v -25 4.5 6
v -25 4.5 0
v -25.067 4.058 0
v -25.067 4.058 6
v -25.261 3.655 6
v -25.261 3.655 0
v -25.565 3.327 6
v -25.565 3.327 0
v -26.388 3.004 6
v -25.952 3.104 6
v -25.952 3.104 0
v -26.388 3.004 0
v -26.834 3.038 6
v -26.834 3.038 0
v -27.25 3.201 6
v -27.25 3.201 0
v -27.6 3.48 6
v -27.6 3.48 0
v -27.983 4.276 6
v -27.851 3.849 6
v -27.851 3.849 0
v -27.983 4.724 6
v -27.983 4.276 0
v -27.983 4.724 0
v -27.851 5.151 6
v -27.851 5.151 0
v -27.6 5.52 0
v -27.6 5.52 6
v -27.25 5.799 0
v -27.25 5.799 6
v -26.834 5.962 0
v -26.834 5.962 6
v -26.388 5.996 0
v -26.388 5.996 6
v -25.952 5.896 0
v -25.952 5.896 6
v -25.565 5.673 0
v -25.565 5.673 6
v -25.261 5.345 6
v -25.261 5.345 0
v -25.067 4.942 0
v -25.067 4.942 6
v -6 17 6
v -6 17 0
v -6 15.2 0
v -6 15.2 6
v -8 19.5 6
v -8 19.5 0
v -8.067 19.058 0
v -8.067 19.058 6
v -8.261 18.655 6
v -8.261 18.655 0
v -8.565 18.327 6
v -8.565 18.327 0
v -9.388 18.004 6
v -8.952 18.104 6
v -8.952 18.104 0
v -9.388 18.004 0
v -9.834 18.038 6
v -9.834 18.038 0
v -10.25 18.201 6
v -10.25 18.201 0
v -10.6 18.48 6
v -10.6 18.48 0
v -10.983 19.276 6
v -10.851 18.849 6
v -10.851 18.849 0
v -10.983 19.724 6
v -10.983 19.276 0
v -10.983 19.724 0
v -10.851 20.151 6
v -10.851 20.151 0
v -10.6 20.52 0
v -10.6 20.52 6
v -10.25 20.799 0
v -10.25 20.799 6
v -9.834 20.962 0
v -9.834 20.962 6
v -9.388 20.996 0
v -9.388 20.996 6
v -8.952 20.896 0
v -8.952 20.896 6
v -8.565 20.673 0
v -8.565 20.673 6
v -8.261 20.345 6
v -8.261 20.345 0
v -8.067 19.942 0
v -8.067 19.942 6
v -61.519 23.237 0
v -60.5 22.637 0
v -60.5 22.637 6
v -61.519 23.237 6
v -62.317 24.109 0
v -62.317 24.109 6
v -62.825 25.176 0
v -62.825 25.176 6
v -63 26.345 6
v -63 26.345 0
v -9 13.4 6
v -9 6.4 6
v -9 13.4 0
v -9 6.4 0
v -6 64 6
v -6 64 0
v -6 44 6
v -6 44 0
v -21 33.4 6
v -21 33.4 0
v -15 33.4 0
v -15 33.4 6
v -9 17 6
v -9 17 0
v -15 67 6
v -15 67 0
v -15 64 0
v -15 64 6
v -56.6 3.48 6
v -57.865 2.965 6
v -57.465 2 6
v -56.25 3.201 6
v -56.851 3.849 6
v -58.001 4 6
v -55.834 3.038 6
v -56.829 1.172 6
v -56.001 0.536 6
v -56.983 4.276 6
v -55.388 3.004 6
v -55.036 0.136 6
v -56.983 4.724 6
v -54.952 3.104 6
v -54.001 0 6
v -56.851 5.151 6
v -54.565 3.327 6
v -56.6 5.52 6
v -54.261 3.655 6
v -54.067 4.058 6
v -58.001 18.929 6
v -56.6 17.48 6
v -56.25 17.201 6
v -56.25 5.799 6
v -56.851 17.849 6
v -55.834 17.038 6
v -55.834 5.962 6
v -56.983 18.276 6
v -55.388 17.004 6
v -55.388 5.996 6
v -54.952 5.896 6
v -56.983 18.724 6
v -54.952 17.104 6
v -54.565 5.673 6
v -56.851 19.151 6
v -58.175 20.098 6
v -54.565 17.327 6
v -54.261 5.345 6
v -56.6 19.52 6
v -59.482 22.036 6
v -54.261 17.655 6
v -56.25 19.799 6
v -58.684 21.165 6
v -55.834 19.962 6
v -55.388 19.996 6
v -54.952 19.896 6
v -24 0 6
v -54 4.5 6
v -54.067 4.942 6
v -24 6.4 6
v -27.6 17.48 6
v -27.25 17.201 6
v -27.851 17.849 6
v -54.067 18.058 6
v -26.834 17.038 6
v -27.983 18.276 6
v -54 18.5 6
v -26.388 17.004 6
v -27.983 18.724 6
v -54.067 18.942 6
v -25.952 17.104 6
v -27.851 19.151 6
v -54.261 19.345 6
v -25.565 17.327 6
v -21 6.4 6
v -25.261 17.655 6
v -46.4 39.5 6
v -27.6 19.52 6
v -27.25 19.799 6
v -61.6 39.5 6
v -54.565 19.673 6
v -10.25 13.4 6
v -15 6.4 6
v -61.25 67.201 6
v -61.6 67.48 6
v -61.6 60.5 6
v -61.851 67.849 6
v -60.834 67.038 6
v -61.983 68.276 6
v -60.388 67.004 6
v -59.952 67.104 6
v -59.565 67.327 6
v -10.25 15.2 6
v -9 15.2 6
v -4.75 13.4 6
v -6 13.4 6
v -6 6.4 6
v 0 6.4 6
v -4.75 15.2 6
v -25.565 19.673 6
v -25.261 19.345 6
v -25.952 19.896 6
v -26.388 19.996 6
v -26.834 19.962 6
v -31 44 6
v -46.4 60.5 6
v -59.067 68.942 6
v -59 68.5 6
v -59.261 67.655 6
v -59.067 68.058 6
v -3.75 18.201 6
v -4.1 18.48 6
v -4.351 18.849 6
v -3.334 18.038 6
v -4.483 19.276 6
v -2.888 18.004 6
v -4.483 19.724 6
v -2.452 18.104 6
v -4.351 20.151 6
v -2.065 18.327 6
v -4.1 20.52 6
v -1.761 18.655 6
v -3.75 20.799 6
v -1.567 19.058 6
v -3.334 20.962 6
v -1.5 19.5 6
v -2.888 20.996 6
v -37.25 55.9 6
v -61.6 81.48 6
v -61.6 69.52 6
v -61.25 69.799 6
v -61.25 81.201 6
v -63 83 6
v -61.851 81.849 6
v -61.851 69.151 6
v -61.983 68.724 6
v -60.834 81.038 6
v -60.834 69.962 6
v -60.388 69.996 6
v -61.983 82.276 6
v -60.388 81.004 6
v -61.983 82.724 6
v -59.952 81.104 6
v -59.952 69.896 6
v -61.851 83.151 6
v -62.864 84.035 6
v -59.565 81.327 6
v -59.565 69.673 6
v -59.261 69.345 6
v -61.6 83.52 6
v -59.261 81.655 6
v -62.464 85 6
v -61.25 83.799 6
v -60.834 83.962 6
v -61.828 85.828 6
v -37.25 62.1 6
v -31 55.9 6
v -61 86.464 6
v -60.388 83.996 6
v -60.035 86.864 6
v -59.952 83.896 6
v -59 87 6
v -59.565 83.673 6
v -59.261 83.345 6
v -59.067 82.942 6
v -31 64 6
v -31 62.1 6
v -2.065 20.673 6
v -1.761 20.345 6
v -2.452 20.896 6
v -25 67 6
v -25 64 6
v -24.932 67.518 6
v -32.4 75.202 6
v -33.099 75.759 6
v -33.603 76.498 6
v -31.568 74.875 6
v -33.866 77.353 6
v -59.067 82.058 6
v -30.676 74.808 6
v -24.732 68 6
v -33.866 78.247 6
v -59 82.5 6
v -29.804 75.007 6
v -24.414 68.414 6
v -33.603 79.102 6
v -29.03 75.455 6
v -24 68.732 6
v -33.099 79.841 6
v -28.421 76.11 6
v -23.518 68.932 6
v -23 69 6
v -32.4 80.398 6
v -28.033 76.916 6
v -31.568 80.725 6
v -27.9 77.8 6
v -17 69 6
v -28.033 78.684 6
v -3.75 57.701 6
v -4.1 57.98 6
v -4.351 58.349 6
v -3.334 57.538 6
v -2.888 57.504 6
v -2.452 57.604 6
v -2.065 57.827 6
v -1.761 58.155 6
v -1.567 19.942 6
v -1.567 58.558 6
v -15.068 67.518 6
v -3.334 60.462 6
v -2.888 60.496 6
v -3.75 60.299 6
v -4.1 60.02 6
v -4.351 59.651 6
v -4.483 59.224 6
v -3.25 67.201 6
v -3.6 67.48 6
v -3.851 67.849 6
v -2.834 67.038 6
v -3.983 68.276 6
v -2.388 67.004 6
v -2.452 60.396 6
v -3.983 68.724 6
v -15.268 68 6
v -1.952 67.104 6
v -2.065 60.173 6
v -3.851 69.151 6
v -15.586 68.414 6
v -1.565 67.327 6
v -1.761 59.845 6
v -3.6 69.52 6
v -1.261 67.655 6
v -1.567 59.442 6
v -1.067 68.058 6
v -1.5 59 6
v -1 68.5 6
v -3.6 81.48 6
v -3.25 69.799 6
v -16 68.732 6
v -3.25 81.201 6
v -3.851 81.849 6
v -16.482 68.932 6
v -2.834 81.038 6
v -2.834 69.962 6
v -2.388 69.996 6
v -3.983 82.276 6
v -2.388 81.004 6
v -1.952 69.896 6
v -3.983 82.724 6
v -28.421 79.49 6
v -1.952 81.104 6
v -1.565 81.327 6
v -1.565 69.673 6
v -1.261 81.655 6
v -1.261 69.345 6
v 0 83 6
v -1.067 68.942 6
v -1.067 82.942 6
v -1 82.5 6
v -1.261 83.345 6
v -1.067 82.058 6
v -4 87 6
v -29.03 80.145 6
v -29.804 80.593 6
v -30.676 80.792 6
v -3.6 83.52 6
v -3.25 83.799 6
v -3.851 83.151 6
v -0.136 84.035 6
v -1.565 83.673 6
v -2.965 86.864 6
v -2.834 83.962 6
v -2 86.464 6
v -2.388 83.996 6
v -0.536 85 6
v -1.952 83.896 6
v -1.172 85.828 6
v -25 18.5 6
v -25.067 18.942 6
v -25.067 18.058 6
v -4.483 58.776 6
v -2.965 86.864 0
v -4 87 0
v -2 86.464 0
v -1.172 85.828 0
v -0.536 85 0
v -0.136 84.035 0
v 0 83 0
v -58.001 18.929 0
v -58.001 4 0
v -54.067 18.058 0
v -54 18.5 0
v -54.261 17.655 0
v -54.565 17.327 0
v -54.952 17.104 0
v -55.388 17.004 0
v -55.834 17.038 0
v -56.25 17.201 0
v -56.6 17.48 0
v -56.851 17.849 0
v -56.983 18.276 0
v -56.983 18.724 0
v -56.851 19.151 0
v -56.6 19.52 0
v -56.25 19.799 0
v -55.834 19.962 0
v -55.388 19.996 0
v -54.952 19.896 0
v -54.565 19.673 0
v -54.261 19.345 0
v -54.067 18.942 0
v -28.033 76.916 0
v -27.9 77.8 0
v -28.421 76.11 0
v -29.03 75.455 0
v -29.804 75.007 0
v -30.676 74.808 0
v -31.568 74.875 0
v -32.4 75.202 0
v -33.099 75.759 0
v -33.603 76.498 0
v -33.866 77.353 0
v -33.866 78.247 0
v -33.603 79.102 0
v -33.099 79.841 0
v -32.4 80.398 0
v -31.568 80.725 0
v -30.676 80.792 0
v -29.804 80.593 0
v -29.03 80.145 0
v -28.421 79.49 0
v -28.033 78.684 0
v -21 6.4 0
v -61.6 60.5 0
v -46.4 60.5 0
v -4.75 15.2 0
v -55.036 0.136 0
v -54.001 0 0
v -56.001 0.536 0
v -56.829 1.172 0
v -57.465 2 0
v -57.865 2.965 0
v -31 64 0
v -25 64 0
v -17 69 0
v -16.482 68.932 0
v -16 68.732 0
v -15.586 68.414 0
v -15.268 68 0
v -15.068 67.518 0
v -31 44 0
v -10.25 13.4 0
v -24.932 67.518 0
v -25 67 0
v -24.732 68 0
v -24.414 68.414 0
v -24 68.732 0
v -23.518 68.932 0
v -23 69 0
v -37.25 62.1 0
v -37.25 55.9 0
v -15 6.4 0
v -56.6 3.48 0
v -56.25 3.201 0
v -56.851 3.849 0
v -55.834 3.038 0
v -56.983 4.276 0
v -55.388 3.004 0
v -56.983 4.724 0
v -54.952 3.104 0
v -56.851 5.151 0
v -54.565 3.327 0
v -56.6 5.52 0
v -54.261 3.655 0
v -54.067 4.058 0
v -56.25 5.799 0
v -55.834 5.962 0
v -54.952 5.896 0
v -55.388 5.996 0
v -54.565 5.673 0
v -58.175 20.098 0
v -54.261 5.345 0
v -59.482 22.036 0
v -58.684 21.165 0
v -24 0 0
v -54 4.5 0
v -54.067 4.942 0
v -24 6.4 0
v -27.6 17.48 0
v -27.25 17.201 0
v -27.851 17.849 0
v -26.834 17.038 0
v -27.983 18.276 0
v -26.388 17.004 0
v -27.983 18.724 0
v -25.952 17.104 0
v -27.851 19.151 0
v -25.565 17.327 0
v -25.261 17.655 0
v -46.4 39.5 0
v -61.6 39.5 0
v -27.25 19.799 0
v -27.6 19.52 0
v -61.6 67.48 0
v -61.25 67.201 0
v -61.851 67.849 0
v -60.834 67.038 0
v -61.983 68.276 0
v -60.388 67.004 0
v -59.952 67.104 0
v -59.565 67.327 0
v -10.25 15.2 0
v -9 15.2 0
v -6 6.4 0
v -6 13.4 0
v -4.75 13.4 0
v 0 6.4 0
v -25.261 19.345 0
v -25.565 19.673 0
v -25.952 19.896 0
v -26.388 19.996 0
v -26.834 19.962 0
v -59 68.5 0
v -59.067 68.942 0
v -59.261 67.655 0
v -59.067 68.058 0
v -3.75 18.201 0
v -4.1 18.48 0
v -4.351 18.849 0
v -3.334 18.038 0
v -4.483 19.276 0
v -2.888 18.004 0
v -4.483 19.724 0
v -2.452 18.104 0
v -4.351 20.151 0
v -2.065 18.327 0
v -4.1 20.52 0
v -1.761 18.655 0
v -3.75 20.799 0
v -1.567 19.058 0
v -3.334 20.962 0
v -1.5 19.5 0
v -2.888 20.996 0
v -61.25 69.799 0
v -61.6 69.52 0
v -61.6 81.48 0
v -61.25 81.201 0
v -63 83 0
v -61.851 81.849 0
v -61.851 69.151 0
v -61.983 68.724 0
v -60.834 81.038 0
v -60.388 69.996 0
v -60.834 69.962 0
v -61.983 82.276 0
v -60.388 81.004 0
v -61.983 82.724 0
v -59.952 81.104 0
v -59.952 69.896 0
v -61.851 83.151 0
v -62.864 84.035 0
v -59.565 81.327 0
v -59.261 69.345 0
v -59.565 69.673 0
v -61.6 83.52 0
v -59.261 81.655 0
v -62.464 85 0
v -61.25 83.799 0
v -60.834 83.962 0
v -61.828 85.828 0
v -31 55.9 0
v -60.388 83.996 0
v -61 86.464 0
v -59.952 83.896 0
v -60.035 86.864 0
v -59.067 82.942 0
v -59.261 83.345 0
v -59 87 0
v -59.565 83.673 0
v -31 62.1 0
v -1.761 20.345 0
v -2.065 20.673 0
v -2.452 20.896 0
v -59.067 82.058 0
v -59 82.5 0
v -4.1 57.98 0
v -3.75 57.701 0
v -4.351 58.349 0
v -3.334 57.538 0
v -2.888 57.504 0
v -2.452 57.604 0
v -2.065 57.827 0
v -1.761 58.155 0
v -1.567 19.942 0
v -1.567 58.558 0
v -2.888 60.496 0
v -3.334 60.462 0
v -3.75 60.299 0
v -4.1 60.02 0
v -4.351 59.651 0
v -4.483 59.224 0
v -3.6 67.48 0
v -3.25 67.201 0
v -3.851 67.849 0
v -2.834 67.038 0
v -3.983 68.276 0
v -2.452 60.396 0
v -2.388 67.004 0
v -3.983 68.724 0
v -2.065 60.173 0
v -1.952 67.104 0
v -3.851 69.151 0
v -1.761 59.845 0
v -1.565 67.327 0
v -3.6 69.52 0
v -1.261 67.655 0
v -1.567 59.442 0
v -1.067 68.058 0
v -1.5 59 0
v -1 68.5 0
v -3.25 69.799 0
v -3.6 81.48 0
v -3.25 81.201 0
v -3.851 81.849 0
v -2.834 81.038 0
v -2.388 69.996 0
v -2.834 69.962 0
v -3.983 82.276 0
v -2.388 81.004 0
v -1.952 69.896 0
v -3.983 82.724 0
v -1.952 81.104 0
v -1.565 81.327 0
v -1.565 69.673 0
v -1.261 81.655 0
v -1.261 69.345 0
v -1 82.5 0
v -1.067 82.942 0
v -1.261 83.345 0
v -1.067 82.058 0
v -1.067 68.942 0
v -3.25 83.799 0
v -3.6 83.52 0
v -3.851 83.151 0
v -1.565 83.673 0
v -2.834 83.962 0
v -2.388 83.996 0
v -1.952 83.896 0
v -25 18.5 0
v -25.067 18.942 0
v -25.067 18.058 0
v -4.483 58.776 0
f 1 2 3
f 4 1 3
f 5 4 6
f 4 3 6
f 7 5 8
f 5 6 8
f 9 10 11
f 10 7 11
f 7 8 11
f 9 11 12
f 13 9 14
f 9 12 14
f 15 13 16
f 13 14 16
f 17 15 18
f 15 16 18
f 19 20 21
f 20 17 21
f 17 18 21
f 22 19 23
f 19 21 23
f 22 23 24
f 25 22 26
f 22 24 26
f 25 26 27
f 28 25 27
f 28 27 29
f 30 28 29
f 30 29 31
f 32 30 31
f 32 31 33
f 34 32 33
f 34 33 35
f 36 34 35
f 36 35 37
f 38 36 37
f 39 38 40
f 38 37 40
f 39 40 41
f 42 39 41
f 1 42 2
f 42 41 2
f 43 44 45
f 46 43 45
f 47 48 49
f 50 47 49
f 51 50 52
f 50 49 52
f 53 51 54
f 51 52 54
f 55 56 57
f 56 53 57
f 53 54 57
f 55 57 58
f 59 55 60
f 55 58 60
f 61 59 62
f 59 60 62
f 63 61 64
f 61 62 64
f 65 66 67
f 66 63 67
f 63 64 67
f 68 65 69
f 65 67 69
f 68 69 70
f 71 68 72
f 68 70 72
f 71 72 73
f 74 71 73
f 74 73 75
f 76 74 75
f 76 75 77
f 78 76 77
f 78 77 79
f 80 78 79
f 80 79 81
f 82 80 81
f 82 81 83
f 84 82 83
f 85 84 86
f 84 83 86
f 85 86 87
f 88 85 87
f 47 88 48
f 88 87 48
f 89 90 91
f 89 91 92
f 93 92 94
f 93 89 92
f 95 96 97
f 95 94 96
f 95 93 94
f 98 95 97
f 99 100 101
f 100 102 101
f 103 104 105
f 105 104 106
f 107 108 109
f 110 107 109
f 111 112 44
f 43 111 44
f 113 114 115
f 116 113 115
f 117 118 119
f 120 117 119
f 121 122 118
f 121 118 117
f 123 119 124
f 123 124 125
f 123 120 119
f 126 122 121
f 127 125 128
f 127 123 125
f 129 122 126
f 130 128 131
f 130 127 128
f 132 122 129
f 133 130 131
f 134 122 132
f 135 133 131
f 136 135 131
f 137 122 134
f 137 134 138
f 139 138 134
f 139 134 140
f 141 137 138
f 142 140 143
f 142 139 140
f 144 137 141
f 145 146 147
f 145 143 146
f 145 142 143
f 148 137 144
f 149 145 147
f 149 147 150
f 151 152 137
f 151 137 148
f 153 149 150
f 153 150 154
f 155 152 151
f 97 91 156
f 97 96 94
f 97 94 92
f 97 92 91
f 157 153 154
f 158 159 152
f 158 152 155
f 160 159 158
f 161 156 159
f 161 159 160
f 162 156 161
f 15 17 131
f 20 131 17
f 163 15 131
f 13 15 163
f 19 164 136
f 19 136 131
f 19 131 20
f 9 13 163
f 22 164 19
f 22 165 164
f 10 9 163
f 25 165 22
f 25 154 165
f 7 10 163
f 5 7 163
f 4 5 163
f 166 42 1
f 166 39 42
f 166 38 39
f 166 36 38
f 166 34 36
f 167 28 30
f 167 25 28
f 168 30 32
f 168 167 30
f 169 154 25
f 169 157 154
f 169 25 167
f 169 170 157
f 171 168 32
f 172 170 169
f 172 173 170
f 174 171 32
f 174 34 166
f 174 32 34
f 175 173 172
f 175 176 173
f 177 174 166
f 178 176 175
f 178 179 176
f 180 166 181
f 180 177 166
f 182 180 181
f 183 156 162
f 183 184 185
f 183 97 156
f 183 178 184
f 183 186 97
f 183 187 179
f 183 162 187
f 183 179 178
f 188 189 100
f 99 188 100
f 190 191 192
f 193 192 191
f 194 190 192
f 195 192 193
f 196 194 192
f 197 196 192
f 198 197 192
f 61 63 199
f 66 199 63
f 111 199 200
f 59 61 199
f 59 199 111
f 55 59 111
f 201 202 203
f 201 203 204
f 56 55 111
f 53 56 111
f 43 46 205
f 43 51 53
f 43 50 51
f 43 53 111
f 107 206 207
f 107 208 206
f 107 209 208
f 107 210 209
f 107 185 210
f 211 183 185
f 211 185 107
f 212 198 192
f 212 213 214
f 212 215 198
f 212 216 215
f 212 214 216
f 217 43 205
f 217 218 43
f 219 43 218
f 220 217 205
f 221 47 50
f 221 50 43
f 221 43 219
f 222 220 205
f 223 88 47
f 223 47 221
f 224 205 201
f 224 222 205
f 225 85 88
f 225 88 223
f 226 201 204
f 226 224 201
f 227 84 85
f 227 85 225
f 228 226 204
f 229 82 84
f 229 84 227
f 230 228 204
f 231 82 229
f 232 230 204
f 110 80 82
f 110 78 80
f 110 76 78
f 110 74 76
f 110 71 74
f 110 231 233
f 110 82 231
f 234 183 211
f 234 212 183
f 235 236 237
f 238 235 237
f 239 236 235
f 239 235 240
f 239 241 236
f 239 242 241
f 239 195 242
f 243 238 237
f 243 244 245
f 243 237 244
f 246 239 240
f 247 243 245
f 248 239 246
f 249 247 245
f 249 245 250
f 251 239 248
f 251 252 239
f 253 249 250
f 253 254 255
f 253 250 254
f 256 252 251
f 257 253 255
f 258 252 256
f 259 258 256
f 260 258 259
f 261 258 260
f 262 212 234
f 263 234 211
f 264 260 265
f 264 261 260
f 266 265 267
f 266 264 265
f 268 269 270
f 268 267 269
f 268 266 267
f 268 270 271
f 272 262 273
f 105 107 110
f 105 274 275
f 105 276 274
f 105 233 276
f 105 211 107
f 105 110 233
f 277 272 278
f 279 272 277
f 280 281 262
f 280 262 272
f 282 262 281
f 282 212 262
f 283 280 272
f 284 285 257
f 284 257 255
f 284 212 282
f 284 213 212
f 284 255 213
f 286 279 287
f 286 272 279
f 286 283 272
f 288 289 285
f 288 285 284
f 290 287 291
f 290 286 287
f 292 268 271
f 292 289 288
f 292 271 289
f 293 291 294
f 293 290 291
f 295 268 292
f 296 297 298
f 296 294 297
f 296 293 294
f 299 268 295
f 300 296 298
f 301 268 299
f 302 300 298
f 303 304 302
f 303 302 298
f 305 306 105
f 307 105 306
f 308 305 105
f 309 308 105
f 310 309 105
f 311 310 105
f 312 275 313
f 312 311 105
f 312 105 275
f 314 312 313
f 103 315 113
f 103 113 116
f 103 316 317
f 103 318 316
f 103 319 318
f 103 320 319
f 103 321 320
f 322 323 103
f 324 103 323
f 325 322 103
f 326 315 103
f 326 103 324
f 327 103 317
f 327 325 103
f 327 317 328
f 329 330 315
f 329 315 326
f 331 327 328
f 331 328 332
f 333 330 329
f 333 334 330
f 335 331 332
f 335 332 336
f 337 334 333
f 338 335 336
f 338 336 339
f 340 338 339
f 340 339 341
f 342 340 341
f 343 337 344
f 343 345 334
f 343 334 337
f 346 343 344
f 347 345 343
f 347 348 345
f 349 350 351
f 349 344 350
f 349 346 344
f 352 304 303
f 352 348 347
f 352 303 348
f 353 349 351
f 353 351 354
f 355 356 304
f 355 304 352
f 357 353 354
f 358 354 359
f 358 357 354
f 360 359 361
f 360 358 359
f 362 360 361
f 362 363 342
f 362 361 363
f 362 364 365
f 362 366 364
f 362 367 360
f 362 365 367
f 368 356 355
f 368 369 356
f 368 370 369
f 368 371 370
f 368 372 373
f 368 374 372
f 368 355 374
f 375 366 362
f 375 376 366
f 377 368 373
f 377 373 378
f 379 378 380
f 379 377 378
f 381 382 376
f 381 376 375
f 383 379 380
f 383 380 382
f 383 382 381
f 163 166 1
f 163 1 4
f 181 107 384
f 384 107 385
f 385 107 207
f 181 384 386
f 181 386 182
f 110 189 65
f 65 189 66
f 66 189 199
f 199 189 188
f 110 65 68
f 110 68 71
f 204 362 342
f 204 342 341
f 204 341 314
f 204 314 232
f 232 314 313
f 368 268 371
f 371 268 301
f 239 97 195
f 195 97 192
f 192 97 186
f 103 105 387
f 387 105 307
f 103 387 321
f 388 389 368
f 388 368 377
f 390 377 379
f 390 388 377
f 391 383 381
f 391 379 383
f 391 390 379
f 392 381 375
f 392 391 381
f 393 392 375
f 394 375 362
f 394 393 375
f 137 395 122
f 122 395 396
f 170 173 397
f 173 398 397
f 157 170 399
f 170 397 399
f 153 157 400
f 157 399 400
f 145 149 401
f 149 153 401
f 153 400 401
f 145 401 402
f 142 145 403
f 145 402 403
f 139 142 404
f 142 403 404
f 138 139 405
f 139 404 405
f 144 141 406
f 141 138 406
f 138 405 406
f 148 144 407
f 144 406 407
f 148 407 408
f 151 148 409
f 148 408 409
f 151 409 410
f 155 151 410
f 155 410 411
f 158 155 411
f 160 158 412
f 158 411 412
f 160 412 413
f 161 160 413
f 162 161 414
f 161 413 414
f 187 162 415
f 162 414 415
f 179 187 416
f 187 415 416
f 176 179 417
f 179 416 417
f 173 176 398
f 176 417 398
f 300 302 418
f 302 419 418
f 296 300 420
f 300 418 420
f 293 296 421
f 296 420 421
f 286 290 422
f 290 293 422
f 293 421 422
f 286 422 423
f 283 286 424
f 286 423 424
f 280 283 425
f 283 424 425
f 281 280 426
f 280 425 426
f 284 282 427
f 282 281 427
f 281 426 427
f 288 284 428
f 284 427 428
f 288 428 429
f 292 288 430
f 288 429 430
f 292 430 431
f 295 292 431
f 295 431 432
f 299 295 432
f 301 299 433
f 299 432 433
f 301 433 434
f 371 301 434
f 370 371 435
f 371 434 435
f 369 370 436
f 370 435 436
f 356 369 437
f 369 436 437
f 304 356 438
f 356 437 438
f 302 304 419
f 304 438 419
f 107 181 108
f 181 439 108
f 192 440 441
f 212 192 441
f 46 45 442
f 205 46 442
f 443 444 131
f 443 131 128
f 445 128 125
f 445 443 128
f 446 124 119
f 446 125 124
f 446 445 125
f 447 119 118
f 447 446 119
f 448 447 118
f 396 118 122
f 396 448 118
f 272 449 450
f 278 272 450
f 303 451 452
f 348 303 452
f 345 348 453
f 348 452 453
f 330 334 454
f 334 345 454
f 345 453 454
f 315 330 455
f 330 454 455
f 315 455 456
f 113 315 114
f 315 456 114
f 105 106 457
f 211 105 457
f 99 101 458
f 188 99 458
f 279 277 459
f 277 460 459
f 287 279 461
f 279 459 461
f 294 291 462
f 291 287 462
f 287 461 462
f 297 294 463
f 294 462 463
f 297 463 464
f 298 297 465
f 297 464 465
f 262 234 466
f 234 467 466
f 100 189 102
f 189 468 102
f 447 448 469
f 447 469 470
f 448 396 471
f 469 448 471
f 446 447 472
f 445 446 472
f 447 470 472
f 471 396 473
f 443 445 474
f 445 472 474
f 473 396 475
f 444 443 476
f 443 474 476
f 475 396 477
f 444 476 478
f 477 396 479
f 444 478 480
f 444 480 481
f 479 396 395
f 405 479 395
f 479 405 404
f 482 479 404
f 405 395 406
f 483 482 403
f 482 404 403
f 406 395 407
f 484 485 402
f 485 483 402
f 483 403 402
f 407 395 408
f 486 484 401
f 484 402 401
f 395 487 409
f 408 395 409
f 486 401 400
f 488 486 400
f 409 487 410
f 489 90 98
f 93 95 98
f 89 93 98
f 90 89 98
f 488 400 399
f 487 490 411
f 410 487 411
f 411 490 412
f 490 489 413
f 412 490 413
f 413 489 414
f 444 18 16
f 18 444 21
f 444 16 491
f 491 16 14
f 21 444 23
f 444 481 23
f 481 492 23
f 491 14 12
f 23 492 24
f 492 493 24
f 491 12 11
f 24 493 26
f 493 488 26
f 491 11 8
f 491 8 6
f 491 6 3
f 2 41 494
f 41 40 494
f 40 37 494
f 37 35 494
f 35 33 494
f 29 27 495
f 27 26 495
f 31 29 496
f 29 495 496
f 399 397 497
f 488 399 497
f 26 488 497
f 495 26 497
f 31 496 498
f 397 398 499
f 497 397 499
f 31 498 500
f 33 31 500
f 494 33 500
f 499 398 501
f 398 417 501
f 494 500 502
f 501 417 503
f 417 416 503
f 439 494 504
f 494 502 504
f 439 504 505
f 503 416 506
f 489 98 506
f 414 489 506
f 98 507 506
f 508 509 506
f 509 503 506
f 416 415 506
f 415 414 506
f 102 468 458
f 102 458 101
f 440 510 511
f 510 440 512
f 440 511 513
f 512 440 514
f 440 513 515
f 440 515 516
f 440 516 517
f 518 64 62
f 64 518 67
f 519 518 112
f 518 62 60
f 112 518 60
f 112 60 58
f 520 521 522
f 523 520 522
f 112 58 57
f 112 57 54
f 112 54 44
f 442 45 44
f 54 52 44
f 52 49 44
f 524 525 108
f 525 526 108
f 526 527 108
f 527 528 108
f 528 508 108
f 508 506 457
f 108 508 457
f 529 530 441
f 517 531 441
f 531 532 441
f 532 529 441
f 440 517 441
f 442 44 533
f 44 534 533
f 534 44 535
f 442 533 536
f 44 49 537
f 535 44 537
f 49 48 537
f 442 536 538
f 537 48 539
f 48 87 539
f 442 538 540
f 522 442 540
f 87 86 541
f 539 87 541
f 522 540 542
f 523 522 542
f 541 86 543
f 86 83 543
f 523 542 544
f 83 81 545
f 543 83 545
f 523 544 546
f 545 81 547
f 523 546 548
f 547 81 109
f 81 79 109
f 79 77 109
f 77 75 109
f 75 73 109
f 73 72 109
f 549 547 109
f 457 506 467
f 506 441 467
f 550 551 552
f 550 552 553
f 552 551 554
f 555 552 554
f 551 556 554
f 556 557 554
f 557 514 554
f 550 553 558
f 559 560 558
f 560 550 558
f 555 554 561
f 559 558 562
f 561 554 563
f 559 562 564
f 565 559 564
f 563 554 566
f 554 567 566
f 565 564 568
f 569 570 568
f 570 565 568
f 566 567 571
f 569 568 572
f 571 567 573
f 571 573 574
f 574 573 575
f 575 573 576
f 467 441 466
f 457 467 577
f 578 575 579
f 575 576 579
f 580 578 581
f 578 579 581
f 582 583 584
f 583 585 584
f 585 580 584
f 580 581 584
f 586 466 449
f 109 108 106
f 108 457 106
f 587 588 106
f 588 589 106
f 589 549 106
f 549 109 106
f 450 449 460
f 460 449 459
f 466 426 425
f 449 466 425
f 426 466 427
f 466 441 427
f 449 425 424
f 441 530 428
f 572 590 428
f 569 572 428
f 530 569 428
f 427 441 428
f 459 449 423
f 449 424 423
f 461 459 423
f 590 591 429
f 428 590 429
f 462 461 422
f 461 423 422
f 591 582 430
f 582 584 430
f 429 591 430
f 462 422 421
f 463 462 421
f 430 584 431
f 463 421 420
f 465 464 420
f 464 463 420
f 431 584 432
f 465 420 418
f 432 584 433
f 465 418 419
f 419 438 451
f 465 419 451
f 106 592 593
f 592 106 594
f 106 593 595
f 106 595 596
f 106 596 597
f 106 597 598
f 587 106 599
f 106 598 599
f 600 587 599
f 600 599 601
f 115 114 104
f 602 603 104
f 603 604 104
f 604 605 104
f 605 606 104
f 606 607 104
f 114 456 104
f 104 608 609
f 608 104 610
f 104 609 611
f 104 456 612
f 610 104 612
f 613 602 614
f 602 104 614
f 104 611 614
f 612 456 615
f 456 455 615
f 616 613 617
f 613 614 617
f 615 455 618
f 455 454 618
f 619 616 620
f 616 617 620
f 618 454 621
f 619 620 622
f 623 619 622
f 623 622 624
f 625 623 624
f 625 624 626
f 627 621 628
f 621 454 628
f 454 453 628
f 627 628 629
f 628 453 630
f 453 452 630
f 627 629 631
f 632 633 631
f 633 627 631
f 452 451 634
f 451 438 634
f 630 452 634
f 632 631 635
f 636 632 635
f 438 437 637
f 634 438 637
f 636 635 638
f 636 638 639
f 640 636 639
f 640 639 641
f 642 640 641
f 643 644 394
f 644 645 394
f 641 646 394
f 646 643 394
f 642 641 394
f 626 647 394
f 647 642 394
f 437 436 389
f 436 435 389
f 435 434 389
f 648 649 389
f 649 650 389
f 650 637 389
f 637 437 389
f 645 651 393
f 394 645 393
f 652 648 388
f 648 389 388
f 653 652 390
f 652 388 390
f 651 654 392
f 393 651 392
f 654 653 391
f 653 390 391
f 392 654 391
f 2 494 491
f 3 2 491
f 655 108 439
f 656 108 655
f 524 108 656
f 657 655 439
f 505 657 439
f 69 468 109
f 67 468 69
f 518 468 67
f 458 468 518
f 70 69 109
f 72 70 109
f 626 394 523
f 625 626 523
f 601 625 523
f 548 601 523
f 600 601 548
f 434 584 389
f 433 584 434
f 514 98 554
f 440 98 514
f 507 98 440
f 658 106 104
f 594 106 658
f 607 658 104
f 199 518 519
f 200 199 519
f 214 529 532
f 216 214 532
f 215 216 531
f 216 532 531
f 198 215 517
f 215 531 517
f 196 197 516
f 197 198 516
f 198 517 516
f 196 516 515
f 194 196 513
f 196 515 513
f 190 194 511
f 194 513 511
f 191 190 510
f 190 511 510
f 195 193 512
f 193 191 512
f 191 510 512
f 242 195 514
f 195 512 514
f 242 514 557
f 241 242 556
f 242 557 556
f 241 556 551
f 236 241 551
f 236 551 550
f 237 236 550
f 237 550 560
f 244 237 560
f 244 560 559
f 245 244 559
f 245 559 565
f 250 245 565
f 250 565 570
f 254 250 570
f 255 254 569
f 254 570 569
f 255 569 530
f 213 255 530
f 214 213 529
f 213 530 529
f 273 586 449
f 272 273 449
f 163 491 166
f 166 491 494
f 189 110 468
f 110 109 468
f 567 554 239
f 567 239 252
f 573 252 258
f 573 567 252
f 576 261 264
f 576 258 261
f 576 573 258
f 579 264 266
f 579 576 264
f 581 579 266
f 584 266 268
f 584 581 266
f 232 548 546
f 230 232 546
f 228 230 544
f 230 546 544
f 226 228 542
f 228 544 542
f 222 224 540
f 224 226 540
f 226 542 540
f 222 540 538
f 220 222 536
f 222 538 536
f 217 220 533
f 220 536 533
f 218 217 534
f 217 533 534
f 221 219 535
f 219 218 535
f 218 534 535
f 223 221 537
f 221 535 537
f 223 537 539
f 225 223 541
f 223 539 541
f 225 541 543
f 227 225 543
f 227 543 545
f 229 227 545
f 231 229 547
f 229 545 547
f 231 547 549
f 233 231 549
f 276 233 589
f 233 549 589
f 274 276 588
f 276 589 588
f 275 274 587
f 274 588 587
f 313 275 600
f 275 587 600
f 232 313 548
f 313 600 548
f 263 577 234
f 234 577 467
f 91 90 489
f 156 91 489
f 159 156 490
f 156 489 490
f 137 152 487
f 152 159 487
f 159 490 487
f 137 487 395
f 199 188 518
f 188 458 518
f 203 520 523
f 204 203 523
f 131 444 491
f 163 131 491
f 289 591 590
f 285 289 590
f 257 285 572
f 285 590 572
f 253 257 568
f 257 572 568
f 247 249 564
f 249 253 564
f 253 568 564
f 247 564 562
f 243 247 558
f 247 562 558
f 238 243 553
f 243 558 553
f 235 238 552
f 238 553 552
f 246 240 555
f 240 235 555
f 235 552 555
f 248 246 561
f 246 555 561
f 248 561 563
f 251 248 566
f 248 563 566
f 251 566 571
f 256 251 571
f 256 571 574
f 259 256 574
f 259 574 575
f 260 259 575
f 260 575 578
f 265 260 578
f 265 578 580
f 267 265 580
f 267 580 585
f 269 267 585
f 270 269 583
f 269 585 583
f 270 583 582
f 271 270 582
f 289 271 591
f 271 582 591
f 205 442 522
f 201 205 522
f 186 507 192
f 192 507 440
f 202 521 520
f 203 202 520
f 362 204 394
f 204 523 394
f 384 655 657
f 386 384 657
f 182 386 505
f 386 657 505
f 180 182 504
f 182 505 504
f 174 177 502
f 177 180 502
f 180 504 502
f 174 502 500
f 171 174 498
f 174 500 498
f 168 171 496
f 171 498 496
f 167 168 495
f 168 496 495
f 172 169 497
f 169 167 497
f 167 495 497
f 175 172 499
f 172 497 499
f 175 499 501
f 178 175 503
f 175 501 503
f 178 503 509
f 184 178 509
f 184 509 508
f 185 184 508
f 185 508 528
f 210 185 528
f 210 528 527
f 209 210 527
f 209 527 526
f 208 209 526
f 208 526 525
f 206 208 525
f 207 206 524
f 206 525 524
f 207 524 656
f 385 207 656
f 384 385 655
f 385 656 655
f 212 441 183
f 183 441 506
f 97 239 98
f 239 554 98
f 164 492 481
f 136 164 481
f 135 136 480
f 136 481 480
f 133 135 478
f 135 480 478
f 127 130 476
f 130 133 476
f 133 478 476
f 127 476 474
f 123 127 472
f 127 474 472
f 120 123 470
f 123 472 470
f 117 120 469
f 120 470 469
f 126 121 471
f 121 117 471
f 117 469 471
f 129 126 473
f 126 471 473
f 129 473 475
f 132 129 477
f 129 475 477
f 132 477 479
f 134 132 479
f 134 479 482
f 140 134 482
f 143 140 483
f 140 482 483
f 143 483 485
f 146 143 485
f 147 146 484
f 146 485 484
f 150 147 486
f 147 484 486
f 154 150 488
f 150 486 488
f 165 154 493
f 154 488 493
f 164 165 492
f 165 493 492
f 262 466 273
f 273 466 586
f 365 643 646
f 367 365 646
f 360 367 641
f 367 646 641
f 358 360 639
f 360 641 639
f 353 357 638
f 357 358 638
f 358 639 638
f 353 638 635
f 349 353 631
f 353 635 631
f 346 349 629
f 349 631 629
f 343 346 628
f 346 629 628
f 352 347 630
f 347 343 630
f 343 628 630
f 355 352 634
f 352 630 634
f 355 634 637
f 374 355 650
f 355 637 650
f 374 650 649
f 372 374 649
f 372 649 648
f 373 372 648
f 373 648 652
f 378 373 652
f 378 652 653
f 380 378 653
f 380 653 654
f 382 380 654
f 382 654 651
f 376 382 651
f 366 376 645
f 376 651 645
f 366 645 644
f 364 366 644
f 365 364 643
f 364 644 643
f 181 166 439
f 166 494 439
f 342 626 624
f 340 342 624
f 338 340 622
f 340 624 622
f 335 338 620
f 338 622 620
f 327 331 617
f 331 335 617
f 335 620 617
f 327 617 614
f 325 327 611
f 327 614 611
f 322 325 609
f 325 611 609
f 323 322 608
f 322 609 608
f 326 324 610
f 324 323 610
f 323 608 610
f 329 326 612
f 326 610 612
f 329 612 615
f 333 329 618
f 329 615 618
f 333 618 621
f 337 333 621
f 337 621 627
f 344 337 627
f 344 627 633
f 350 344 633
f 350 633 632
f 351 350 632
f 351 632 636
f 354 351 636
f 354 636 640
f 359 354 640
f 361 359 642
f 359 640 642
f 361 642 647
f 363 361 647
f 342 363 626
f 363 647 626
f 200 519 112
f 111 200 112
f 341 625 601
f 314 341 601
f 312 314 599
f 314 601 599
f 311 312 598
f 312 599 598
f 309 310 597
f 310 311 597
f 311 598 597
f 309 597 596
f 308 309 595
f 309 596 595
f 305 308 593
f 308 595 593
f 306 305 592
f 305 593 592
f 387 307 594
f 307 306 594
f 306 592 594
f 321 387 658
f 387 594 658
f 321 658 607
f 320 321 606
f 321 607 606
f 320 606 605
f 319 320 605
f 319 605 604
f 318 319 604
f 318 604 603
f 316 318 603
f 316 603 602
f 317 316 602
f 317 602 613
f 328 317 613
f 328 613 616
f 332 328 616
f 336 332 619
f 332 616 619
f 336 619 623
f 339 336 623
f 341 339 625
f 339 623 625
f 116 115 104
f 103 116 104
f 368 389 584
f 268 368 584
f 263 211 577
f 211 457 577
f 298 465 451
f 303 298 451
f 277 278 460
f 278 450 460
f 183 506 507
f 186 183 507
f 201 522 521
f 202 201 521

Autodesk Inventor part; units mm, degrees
ref_plane "YZ Plane" through (0, 0, 0) normal (1, 0, 0) x (0, 1, 0)
ref_plane "XZ Plane" through (0, 0, 0) normal (0, 1, 0) x (-1, 0, 0)
ref_plane "XY Plane" through (0, 0, 0) normal (0, 0, 1) x (1, 0, 0)
sketch "Sketch1" plane through (0, 0, 0) normal (0, 0, 1) x (1, 0, 0)
  line L0 (-31, 44) -> (-31, 55.9)
  line L1 (-31, 55.9) -> (-37.25, 55.9)
  line L2 (-37.25, 55.9) -> (-37.25, 62.1)
  line L3 (-37.25, 62.1) -> (-31, 62.1)
  line L4 (-31, 62.1) -> (-31, 64)
  line L5 (-31, 64) -> (-25, 64)
  line L6 (-25, 64) -> (-25, 67)
  arc A0 (-23, 69) -> (-25, 67) centre (-23, 67) ccw
  line L7 (-23, 69) -> (-17, 69)
  arc A1 (-15, 67) -> (-17, 69) centre (-17, 67) ccw
  line L8 (-15, 67) -> (-15, 64)
  line L9 (-15, 64) -> (-6, 64)
  line L10 (-6, 64) -> (-6, 44)
  line L11 (-6, 44) -> (-31, 44)
  line L12 (-61.6, 39.5) -> (-61.6, 60.5)
  line L13 (-61.6, 60.5) -> (-46.4, 60.5)
  line L14 (-46.4, 60.5) -> (-46.4, 39.5)
  line L15 (-46.4, 39.5) -> (-61.6, 39.5)
  circle A2 centre (-30.9, 77.8) radius 3
  circle A3 centre (-3, 59) radius 1.5
  circle A4 centre (-26.5, 18.5) radius 1.5
  circle A5 centre (-26.5, 4.5) radius 1.5
  circle A6 centre (-55.5, 4.5) radius 1.5
  circle A7 centre (-55.5, 18.5) radius 1.5
  circle A8 centre (-3, 19.5) radius 1.5
  circle A9 centre (-9.5, 19.5) radius 1.5
  circle A10 centre (-60.5, 68.5) radius 1.5
  circle A11 centre (-60.5, 82.5) radius 1.5
  circle A12 centre (-2.5, 82.5) radius 1.5
  circle A13 centre (-2.5, 68.5) radius 1.5
  arc A14 (0, 83) -> (-4, 87) centre (-4, 83) ccw
  line L16 (-4, 87) -> (-59, 87)
  arc A15 (-59, 87) -> (-63, 83) centre (-59, 83) ccw
  line L17 (-63, 83) -> (-63, 26.3448)
  arc A16 (-63, 26.3448) -> (-60.5004, 22.6368) centre (-59, 26.3448) ccw
  arc A17 (-58.0008, 18.9289) -> (-60.5004, 22.6368) centre (-62.0008, 18.9289) ccw
  line L18 (-58.0008, 18.9289) -> (-58.0008, 4)
  arc A18 (-58.0008, 4) -> (-54.0008, 0) centre (-54.0008, 4) ccw
  line L19 (-54.0008, 0) -> (-24, 0)
  line L20 (-24, 0) -> (-24, 6.4)
  line L21 (-24, 6.4) -> (-21, 6.4)
  line L22 (-21, 6.4) -> (-21, 33.4)
  line L23 (-21, 33.4) -> (-15, 33.4)
  line L24 (-15, 33.4) -> (-15, 6.4)
  line L25 (-15, 6.4) -> (-9, 6.4)
  line L26 (-9, 6.4) -> (-9, 13.4)
  line L27 (-9, 13.4) -> (-10.25, 13.4)
  line L28 (-10.25, 13.4) -> (-10.25, 15.2)
  line L29 (-10.25, 15.2) -> (-9, 15.2)
  line L30 (-9, 15.2) -> (-9, 17)
  line L31 (-9, 17) -> (-6, 17)
  line L32 (-6, 17) -> (-6, 15.2)
  line L33 (-6, 15.2) -> (-4.75, 15.2)
  line L34 (-4.75, 15.2) -> (-4.75, 13.4)
  line L35 (-4.75, 13.4) -> (-6, 13.4)
  line L36 (-6, 13.4) -> (-6, 6.4)
  line L37 (-6, 6.4) -> (0, 6.4)
  line L38 (0, 6.4) -> (0, 83)
  point P0 (0, 0)
  point P1 (0, 0)
extrude "Extrusion1" add sketch "Sketch1" along normal blind 6
properties part number "yCarTop"
